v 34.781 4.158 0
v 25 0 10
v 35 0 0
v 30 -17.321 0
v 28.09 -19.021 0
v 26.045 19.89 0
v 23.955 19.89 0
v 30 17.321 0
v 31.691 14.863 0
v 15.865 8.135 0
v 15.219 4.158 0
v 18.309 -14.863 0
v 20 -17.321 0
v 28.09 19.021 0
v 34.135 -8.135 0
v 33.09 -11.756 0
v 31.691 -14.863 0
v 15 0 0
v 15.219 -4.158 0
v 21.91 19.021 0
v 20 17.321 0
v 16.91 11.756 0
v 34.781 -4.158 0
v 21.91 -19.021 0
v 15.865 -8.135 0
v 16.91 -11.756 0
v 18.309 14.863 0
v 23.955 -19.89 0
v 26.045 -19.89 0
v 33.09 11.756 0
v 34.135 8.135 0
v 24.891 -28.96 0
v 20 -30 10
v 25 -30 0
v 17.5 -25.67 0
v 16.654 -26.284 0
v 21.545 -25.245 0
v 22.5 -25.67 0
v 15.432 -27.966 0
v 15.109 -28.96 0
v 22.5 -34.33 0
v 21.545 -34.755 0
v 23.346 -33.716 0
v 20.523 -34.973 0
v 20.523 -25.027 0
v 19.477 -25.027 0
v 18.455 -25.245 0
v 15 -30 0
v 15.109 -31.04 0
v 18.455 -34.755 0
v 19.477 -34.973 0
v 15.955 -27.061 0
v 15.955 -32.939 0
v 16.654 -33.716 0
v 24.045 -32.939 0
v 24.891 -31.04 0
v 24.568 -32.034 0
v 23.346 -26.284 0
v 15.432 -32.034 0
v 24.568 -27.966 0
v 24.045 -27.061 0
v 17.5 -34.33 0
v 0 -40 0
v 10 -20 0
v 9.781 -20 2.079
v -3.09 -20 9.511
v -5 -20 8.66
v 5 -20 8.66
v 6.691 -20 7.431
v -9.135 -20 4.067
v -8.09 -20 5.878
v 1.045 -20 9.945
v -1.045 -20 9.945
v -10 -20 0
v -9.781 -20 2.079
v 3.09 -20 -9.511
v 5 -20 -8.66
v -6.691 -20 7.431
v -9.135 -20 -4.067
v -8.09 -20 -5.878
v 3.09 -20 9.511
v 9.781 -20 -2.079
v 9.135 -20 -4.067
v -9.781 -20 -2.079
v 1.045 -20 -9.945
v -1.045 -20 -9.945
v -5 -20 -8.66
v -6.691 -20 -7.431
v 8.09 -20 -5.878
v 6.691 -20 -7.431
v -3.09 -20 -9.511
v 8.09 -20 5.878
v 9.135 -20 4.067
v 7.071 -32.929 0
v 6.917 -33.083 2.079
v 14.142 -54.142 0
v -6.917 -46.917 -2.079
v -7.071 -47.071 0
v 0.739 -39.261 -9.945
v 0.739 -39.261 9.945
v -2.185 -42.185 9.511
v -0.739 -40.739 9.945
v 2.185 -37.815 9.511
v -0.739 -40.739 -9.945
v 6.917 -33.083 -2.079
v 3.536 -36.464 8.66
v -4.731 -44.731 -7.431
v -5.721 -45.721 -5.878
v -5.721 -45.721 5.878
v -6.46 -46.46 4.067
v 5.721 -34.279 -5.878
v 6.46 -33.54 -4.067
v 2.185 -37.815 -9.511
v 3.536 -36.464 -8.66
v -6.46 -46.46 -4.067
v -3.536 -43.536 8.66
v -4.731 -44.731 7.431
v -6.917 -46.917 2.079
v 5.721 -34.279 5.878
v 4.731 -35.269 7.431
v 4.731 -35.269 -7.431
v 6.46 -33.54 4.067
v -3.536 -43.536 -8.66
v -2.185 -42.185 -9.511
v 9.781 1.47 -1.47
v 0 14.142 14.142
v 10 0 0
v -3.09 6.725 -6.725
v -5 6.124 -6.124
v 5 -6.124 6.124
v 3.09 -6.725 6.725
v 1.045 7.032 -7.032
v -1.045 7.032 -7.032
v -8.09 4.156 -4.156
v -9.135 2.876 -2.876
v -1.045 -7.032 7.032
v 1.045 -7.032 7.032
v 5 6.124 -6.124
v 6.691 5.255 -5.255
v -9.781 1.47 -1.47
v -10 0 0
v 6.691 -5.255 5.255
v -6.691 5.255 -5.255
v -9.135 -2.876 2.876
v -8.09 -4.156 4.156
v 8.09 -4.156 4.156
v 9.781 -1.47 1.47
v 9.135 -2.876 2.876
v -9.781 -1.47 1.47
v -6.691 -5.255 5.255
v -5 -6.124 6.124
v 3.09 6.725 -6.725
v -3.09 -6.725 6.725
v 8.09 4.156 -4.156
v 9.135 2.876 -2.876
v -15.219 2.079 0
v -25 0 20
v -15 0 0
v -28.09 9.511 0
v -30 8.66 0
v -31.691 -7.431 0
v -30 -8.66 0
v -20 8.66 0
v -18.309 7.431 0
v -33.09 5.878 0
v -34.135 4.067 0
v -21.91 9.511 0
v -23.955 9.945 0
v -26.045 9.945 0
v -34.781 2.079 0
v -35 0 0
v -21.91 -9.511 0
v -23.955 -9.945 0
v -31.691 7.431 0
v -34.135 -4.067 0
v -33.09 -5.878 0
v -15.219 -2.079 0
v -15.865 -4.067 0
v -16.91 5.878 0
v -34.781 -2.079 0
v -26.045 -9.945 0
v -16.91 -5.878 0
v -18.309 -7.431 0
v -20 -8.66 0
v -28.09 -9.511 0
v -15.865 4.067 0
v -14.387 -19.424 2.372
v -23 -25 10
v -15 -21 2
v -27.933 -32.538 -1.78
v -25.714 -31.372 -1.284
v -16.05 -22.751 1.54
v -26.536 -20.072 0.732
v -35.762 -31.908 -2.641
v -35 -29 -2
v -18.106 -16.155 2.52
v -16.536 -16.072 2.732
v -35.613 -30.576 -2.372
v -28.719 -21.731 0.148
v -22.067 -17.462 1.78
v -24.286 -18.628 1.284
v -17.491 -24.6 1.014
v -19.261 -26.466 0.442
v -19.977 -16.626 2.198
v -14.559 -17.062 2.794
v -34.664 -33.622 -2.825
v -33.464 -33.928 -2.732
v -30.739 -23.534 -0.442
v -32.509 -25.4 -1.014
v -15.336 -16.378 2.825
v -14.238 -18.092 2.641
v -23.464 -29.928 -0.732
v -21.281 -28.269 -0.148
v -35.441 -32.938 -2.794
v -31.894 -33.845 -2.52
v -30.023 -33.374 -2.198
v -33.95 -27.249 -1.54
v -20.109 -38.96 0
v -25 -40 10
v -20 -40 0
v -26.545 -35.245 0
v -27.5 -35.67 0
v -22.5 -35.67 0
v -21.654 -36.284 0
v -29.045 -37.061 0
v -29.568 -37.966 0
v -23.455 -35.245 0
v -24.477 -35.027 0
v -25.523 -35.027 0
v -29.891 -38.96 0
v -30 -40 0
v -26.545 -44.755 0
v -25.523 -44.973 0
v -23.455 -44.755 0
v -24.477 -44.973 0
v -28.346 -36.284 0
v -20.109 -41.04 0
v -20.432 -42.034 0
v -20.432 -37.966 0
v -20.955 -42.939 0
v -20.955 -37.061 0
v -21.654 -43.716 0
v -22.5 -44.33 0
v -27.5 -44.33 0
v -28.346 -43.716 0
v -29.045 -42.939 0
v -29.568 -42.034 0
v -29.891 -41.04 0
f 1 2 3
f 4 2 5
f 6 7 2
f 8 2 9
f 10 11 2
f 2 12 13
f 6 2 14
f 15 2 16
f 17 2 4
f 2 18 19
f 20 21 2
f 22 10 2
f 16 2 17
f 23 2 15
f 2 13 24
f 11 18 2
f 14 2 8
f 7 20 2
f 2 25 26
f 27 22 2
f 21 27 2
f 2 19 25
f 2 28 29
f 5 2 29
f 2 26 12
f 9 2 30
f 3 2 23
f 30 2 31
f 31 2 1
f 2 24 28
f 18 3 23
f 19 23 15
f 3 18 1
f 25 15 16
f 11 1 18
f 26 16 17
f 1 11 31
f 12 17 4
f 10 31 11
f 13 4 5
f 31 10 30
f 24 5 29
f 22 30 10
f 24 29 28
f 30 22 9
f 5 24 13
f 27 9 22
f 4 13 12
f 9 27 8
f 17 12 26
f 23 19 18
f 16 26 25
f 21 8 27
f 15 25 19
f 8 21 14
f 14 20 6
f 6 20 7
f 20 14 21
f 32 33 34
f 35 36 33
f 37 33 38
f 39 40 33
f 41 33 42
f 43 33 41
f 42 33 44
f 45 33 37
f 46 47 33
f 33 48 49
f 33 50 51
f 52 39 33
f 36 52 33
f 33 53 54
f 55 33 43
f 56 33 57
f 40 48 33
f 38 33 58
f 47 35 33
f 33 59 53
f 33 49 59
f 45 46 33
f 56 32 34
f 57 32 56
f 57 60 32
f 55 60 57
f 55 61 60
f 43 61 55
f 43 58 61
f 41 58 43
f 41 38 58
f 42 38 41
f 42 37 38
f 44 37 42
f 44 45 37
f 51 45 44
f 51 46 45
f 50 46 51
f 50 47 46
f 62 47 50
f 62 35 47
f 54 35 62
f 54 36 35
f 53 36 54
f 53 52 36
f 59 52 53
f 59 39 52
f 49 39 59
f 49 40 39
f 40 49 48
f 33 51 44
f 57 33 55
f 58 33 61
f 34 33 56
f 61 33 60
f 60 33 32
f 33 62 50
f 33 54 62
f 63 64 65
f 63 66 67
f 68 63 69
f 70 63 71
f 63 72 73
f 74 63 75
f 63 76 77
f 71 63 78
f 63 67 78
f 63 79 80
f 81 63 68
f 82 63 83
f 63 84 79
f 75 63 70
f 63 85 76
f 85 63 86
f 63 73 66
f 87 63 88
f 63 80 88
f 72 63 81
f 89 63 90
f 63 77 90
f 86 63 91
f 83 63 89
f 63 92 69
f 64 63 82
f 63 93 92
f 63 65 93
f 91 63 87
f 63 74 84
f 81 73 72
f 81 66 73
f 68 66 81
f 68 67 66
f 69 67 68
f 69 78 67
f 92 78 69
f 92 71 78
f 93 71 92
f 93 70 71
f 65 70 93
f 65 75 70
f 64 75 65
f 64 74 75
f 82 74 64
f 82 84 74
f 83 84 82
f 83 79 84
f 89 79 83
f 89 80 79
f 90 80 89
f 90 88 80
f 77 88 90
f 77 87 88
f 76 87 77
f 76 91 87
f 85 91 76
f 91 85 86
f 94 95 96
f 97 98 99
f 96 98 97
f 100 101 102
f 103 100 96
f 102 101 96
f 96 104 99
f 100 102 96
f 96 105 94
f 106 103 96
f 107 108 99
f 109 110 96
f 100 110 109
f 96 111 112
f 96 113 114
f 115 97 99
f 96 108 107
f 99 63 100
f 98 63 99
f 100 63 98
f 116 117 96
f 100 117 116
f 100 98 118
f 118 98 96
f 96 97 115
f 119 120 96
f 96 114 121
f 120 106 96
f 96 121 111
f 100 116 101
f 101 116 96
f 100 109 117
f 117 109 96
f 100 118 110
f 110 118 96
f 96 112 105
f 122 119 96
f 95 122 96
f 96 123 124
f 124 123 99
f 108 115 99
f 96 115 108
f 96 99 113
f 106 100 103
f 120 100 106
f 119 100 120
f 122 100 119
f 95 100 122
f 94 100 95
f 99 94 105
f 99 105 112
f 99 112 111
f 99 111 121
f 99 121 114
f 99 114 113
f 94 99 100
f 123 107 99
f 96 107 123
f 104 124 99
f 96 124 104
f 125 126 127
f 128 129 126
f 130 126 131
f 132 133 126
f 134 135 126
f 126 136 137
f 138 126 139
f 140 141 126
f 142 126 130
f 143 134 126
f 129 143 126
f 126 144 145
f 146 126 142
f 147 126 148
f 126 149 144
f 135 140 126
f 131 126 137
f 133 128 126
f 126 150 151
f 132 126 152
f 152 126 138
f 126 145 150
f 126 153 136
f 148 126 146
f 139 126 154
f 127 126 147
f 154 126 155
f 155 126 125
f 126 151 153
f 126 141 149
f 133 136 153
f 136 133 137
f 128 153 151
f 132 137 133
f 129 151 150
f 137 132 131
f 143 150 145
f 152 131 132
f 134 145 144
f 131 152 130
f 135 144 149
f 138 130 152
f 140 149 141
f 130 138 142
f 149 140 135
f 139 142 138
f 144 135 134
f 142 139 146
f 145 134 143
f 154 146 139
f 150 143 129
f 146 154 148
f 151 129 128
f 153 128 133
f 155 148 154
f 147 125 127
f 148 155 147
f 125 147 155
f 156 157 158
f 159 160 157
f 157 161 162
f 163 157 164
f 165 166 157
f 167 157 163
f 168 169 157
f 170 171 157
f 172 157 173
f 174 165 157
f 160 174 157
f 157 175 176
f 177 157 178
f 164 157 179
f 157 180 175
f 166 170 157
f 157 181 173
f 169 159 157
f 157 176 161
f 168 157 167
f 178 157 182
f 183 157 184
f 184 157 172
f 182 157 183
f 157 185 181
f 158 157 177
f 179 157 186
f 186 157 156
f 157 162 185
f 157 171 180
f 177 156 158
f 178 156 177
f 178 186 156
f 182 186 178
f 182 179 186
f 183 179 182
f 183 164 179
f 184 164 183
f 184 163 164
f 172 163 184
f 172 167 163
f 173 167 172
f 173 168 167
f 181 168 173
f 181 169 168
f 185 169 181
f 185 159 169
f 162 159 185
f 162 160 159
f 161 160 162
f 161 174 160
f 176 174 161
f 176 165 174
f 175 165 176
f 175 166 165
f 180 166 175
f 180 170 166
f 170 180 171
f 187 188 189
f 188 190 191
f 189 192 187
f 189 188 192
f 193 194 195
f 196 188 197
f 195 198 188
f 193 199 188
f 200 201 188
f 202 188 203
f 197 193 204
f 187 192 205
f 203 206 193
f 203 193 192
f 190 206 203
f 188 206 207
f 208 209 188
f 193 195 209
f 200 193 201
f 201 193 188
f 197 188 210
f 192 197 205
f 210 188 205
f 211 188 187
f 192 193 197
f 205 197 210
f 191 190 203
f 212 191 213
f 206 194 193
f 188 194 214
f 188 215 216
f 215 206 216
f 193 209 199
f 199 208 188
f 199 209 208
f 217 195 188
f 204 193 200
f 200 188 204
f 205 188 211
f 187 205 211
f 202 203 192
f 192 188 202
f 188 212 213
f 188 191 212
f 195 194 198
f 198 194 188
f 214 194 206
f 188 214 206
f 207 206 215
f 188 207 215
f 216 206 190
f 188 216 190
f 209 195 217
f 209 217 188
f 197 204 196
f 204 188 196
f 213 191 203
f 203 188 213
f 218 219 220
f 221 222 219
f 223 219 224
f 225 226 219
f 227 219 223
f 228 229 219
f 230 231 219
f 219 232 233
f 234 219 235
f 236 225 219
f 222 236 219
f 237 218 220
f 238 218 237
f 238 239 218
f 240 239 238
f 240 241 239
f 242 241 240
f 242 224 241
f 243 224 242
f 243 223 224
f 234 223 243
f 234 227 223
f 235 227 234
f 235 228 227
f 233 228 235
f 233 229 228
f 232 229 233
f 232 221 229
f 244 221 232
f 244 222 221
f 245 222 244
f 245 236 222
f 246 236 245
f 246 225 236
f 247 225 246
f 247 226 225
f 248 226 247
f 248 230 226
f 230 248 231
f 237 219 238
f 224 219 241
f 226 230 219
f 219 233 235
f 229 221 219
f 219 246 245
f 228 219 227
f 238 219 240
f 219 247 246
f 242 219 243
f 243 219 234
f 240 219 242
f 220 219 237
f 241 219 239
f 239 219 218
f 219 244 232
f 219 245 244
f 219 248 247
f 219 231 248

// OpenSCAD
// Volume: 11564.0482202177, SurfaceArea: 6536.781393381151
module mycyl() {
  cylinder(r1=10, r2=0, h=20);
}

translate([25,0,0]) scale([1,2,0.5]) mycyl();
translate([20,-30,0]) scale(0.5) mycyl();
translate([0,-20,0]) rotate([90,0,0]) mycyl();
translate([0,-40,0]) rotate([90,0,45]) mycyl();
rotate(v=[-1,0,0], a=45) mycyl();
multmatrix([[1,0,0,-25],
            [0,1,0,0],
            [0,0,1,0],
            [0,0,0,1]]) mycyl();
multmatrix([[1,0.4,0.1,-25],
            [0.4,0.8,0,-25],
            [0.2,0.2,0.5,0],
            [0,0,0,1]]) mycyl();
translate([-25,-40,0])
  multmatrix([[1,0,0,0],
              [0,1,0,0],
              [0,0,1,0],
              [0,0,0,2]]) mycyl();
